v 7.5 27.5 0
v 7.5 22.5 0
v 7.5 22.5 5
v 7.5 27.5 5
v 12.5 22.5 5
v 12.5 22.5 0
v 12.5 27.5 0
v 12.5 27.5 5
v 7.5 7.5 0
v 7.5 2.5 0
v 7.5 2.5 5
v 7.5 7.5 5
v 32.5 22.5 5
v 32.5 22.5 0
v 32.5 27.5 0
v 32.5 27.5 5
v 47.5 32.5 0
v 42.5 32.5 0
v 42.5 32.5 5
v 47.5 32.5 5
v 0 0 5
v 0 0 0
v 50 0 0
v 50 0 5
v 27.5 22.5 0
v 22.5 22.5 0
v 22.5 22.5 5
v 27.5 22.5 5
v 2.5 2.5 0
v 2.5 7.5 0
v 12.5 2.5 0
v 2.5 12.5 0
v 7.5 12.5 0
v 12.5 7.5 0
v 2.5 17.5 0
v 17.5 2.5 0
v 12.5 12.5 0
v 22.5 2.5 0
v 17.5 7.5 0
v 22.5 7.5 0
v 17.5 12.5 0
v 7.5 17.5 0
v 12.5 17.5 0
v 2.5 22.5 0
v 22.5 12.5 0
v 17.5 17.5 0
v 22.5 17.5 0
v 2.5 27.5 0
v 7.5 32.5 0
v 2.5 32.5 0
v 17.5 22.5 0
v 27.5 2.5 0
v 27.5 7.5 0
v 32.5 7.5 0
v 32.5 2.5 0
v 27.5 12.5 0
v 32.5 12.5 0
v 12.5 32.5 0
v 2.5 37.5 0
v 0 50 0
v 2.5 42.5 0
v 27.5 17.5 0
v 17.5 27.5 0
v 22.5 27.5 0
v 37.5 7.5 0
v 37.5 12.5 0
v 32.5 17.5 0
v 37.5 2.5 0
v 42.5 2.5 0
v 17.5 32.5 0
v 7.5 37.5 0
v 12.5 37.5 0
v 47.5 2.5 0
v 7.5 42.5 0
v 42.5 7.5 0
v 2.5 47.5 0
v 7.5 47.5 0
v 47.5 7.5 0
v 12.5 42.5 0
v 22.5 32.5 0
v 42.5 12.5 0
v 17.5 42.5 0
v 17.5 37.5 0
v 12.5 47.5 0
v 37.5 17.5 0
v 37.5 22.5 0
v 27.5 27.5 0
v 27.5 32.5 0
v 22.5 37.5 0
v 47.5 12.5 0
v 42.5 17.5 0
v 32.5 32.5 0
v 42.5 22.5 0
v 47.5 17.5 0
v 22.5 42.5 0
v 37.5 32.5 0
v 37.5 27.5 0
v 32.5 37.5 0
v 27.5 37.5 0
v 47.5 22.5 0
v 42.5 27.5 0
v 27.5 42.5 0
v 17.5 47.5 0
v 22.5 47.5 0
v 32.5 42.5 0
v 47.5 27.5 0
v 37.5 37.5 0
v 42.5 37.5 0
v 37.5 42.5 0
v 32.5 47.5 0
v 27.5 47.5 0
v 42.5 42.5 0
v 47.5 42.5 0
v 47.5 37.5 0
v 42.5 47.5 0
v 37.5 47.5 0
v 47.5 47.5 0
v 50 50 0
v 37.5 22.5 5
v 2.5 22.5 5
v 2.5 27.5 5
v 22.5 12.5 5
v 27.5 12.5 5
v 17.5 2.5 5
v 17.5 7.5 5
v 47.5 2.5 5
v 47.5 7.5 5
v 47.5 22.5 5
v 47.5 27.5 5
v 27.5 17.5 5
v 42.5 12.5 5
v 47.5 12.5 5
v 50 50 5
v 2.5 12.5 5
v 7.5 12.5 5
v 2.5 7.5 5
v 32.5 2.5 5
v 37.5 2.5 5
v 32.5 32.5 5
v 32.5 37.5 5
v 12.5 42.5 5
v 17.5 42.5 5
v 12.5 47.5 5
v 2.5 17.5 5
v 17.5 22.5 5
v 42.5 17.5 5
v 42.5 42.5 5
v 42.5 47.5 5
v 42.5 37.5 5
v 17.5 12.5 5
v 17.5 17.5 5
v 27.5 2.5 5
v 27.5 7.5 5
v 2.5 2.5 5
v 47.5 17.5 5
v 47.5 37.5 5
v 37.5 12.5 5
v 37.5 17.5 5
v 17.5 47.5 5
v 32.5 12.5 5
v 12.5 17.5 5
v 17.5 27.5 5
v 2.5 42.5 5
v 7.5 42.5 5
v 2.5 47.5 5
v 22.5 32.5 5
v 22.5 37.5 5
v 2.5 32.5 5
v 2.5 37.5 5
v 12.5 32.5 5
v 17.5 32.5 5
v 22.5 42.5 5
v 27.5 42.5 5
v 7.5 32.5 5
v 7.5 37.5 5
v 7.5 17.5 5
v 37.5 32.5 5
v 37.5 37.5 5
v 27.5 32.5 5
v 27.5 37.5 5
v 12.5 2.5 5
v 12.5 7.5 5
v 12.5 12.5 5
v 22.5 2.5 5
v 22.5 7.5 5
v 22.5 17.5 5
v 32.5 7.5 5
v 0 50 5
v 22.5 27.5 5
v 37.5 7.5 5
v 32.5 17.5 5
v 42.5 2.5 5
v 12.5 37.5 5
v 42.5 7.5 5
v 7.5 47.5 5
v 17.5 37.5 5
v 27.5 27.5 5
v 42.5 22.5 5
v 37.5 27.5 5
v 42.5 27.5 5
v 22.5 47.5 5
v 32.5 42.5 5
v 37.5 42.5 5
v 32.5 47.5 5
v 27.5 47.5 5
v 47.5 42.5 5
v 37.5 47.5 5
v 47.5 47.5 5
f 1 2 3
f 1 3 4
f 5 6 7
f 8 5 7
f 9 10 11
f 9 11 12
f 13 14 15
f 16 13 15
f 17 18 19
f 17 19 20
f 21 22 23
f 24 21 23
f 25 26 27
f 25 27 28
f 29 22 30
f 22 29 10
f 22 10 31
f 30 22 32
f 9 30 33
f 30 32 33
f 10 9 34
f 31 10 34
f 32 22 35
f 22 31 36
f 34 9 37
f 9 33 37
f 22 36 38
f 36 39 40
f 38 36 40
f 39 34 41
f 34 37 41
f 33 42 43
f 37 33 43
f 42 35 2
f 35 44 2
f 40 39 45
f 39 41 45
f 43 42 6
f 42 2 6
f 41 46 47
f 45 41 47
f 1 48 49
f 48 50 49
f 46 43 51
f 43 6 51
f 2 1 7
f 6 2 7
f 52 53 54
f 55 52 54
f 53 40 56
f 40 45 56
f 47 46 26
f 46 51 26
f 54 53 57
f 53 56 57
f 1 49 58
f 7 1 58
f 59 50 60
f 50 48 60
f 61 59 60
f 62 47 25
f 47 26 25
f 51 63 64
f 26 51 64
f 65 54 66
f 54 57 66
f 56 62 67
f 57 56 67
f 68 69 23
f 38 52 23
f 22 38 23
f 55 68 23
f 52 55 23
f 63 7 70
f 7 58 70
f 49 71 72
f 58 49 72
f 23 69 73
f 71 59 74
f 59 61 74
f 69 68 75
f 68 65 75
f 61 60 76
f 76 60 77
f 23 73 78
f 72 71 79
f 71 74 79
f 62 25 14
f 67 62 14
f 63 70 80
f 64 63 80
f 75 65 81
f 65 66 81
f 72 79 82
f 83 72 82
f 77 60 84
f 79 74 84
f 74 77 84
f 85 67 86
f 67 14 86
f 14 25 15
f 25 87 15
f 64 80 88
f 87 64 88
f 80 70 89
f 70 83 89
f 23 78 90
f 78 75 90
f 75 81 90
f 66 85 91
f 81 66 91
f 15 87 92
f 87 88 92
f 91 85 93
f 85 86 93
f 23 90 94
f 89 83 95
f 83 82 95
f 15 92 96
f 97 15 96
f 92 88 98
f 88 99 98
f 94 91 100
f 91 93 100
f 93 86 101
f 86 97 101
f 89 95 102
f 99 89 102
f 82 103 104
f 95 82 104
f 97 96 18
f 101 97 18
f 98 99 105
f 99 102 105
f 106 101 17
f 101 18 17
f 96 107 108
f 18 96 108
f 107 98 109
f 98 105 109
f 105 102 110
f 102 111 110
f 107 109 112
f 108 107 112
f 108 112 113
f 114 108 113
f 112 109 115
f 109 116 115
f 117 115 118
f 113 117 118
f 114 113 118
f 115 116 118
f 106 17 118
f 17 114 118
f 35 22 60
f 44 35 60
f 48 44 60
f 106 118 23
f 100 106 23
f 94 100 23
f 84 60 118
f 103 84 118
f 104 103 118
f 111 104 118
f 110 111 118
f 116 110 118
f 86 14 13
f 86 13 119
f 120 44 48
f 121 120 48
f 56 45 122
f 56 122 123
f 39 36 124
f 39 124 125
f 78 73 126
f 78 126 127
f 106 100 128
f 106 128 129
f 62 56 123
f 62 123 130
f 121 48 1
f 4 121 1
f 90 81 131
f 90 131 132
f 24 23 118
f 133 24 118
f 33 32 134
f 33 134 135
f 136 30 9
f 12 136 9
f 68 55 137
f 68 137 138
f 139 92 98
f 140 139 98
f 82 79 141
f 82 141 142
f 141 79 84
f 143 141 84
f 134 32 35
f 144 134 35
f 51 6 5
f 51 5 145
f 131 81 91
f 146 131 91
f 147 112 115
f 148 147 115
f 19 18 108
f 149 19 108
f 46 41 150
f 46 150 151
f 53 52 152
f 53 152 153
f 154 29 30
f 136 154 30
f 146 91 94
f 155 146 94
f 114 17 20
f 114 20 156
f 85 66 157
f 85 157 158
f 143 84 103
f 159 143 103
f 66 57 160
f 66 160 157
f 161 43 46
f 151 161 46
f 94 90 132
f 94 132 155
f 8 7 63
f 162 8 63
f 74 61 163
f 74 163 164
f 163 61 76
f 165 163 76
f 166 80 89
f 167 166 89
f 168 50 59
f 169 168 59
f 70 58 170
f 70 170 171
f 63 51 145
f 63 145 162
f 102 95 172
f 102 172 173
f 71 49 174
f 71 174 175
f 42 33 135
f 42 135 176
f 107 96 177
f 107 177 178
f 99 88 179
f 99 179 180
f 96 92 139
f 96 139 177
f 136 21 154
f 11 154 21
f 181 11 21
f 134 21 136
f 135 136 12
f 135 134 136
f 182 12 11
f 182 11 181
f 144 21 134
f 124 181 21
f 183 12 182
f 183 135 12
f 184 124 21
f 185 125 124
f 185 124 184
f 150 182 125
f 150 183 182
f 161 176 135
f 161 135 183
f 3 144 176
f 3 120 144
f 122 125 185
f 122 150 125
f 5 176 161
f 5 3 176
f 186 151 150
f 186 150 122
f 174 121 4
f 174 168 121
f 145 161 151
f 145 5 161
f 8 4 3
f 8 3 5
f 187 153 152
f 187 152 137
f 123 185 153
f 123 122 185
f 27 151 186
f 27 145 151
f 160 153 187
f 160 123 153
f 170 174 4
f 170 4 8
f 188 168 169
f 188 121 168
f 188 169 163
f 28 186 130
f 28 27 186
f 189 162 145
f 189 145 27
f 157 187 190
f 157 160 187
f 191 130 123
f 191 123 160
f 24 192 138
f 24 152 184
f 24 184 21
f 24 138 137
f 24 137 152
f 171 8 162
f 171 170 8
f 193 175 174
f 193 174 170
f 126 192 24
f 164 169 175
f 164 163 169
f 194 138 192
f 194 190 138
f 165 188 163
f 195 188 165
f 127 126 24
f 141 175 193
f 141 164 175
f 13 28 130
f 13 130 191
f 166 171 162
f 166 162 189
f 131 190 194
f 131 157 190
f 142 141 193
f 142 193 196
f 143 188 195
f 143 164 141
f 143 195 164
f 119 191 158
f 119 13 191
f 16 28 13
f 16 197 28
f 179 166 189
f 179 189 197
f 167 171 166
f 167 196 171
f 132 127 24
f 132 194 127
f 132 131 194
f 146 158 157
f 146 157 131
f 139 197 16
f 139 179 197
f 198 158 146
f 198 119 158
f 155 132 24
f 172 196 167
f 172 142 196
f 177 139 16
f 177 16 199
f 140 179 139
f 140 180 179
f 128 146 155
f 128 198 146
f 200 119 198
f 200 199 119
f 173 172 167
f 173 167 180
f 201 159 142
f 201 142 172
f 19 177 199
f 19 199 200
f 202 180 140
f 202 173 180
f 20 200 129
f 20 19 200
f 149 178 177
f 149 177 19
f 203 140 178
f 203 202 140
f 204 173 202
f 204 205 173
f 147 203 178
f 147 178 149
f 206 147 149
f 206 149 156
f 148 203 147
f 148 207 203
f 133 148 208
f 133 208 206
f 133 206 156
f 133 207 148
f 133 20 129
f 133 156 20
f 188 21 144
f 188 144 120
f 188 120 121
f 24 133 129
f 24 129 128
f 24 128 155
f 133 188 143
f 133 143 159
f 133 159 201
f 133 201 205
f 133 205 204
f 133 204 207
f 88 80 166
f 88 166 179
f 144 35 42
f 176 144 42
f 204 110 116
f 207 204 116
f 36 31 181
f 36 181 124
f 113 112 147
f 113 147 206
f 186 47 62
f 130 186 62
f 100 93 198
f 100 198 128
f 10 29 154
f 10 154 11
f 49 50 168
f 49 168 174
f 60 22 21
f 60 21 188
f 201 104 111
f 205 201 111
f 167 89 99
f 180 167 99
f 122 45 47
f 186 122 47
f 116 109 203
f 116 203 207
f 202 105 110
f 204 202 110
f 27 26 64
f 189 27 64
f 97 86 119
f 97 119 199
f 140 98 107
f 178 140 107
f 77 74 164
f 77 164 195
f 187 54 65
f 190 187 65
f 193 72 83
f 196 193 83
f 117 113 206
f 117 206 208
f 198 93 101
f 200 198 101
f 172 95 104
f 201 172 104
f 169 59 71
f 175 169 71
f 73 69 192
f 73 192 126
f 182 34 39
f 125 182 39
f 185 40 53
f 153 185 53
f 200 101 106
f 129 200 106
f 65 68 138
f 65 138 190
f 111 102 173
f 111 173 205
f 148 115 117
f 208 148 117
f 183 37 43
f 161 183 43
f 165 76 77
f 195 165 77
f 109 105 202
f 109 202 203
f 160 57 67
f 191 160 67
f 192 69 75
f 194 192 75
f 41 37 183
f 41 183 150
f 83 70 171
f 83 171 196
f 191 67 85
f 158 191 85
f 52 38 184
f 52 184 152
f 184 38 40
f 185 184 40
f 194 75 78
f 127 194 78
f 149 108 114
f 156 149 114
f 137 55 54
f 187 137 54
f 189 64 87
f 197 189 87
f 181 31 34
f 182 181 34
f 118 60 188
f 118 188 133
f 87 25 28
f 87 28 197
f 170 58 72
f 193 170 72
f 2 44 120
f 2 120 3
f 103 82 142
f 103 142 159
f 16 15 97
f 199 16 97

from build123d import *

# Parameters (mm, degrees)
BOX001_W      = 5
BOX001_H      = 5
BOX001_DEPTH  = 5
ARRAY_X_COUNT = 5
ARRAY_X_PITCH = 10
ARRAY_Y_COUNT = 5
ARRAY_Y_PITCH = 10
BOX_W         = 50
BOX_H         = 50
BOX_DEPTH     = 5


with BuildPart() as array:
    # Box001 → Box001 (new body)
    with BuildSketch(Plane.XY):
        with Locations((2.5, 2.5)):
            Rectangle(BOX001_W, BOX001_H)
    extrude(amount=BOX001_DEPTH)

    # Array X: Array ×5


with BuildPart() as array_1:
    add(array.part)
    with Locations(*[(i * ARRAY_X_PITCH, 0, 0) for i in range(1, ARRAY_X_COUNT)]):
        add(array.part)

    # Array Y: Array ×5


with BuildPart() as array_2:
    add(array_1.part)
    with Locations(*[(0, i * ARRAY_Y_PITCH, 0) for i in range(1, ARRAY_Y_COUNT)]):
        add(array_1.part)


with BuildPart() as array_3:
    # Array placement: moved
    add(array_2.part.moved(Location((2.5, 2.5, 0))))


with BuildPart() as cut:
    # Box → Box (new body)
    with BuildSketch(Plane.XY):
        with Locations((25, 25)):
            Rectangle(BOX_W, BOX_H)
    extrude(amount=BOX_DEPTH)

    # Cut: cut Array
    add(array_3.part, mode=Mode.SUBTRACT)


solid = cut.part
